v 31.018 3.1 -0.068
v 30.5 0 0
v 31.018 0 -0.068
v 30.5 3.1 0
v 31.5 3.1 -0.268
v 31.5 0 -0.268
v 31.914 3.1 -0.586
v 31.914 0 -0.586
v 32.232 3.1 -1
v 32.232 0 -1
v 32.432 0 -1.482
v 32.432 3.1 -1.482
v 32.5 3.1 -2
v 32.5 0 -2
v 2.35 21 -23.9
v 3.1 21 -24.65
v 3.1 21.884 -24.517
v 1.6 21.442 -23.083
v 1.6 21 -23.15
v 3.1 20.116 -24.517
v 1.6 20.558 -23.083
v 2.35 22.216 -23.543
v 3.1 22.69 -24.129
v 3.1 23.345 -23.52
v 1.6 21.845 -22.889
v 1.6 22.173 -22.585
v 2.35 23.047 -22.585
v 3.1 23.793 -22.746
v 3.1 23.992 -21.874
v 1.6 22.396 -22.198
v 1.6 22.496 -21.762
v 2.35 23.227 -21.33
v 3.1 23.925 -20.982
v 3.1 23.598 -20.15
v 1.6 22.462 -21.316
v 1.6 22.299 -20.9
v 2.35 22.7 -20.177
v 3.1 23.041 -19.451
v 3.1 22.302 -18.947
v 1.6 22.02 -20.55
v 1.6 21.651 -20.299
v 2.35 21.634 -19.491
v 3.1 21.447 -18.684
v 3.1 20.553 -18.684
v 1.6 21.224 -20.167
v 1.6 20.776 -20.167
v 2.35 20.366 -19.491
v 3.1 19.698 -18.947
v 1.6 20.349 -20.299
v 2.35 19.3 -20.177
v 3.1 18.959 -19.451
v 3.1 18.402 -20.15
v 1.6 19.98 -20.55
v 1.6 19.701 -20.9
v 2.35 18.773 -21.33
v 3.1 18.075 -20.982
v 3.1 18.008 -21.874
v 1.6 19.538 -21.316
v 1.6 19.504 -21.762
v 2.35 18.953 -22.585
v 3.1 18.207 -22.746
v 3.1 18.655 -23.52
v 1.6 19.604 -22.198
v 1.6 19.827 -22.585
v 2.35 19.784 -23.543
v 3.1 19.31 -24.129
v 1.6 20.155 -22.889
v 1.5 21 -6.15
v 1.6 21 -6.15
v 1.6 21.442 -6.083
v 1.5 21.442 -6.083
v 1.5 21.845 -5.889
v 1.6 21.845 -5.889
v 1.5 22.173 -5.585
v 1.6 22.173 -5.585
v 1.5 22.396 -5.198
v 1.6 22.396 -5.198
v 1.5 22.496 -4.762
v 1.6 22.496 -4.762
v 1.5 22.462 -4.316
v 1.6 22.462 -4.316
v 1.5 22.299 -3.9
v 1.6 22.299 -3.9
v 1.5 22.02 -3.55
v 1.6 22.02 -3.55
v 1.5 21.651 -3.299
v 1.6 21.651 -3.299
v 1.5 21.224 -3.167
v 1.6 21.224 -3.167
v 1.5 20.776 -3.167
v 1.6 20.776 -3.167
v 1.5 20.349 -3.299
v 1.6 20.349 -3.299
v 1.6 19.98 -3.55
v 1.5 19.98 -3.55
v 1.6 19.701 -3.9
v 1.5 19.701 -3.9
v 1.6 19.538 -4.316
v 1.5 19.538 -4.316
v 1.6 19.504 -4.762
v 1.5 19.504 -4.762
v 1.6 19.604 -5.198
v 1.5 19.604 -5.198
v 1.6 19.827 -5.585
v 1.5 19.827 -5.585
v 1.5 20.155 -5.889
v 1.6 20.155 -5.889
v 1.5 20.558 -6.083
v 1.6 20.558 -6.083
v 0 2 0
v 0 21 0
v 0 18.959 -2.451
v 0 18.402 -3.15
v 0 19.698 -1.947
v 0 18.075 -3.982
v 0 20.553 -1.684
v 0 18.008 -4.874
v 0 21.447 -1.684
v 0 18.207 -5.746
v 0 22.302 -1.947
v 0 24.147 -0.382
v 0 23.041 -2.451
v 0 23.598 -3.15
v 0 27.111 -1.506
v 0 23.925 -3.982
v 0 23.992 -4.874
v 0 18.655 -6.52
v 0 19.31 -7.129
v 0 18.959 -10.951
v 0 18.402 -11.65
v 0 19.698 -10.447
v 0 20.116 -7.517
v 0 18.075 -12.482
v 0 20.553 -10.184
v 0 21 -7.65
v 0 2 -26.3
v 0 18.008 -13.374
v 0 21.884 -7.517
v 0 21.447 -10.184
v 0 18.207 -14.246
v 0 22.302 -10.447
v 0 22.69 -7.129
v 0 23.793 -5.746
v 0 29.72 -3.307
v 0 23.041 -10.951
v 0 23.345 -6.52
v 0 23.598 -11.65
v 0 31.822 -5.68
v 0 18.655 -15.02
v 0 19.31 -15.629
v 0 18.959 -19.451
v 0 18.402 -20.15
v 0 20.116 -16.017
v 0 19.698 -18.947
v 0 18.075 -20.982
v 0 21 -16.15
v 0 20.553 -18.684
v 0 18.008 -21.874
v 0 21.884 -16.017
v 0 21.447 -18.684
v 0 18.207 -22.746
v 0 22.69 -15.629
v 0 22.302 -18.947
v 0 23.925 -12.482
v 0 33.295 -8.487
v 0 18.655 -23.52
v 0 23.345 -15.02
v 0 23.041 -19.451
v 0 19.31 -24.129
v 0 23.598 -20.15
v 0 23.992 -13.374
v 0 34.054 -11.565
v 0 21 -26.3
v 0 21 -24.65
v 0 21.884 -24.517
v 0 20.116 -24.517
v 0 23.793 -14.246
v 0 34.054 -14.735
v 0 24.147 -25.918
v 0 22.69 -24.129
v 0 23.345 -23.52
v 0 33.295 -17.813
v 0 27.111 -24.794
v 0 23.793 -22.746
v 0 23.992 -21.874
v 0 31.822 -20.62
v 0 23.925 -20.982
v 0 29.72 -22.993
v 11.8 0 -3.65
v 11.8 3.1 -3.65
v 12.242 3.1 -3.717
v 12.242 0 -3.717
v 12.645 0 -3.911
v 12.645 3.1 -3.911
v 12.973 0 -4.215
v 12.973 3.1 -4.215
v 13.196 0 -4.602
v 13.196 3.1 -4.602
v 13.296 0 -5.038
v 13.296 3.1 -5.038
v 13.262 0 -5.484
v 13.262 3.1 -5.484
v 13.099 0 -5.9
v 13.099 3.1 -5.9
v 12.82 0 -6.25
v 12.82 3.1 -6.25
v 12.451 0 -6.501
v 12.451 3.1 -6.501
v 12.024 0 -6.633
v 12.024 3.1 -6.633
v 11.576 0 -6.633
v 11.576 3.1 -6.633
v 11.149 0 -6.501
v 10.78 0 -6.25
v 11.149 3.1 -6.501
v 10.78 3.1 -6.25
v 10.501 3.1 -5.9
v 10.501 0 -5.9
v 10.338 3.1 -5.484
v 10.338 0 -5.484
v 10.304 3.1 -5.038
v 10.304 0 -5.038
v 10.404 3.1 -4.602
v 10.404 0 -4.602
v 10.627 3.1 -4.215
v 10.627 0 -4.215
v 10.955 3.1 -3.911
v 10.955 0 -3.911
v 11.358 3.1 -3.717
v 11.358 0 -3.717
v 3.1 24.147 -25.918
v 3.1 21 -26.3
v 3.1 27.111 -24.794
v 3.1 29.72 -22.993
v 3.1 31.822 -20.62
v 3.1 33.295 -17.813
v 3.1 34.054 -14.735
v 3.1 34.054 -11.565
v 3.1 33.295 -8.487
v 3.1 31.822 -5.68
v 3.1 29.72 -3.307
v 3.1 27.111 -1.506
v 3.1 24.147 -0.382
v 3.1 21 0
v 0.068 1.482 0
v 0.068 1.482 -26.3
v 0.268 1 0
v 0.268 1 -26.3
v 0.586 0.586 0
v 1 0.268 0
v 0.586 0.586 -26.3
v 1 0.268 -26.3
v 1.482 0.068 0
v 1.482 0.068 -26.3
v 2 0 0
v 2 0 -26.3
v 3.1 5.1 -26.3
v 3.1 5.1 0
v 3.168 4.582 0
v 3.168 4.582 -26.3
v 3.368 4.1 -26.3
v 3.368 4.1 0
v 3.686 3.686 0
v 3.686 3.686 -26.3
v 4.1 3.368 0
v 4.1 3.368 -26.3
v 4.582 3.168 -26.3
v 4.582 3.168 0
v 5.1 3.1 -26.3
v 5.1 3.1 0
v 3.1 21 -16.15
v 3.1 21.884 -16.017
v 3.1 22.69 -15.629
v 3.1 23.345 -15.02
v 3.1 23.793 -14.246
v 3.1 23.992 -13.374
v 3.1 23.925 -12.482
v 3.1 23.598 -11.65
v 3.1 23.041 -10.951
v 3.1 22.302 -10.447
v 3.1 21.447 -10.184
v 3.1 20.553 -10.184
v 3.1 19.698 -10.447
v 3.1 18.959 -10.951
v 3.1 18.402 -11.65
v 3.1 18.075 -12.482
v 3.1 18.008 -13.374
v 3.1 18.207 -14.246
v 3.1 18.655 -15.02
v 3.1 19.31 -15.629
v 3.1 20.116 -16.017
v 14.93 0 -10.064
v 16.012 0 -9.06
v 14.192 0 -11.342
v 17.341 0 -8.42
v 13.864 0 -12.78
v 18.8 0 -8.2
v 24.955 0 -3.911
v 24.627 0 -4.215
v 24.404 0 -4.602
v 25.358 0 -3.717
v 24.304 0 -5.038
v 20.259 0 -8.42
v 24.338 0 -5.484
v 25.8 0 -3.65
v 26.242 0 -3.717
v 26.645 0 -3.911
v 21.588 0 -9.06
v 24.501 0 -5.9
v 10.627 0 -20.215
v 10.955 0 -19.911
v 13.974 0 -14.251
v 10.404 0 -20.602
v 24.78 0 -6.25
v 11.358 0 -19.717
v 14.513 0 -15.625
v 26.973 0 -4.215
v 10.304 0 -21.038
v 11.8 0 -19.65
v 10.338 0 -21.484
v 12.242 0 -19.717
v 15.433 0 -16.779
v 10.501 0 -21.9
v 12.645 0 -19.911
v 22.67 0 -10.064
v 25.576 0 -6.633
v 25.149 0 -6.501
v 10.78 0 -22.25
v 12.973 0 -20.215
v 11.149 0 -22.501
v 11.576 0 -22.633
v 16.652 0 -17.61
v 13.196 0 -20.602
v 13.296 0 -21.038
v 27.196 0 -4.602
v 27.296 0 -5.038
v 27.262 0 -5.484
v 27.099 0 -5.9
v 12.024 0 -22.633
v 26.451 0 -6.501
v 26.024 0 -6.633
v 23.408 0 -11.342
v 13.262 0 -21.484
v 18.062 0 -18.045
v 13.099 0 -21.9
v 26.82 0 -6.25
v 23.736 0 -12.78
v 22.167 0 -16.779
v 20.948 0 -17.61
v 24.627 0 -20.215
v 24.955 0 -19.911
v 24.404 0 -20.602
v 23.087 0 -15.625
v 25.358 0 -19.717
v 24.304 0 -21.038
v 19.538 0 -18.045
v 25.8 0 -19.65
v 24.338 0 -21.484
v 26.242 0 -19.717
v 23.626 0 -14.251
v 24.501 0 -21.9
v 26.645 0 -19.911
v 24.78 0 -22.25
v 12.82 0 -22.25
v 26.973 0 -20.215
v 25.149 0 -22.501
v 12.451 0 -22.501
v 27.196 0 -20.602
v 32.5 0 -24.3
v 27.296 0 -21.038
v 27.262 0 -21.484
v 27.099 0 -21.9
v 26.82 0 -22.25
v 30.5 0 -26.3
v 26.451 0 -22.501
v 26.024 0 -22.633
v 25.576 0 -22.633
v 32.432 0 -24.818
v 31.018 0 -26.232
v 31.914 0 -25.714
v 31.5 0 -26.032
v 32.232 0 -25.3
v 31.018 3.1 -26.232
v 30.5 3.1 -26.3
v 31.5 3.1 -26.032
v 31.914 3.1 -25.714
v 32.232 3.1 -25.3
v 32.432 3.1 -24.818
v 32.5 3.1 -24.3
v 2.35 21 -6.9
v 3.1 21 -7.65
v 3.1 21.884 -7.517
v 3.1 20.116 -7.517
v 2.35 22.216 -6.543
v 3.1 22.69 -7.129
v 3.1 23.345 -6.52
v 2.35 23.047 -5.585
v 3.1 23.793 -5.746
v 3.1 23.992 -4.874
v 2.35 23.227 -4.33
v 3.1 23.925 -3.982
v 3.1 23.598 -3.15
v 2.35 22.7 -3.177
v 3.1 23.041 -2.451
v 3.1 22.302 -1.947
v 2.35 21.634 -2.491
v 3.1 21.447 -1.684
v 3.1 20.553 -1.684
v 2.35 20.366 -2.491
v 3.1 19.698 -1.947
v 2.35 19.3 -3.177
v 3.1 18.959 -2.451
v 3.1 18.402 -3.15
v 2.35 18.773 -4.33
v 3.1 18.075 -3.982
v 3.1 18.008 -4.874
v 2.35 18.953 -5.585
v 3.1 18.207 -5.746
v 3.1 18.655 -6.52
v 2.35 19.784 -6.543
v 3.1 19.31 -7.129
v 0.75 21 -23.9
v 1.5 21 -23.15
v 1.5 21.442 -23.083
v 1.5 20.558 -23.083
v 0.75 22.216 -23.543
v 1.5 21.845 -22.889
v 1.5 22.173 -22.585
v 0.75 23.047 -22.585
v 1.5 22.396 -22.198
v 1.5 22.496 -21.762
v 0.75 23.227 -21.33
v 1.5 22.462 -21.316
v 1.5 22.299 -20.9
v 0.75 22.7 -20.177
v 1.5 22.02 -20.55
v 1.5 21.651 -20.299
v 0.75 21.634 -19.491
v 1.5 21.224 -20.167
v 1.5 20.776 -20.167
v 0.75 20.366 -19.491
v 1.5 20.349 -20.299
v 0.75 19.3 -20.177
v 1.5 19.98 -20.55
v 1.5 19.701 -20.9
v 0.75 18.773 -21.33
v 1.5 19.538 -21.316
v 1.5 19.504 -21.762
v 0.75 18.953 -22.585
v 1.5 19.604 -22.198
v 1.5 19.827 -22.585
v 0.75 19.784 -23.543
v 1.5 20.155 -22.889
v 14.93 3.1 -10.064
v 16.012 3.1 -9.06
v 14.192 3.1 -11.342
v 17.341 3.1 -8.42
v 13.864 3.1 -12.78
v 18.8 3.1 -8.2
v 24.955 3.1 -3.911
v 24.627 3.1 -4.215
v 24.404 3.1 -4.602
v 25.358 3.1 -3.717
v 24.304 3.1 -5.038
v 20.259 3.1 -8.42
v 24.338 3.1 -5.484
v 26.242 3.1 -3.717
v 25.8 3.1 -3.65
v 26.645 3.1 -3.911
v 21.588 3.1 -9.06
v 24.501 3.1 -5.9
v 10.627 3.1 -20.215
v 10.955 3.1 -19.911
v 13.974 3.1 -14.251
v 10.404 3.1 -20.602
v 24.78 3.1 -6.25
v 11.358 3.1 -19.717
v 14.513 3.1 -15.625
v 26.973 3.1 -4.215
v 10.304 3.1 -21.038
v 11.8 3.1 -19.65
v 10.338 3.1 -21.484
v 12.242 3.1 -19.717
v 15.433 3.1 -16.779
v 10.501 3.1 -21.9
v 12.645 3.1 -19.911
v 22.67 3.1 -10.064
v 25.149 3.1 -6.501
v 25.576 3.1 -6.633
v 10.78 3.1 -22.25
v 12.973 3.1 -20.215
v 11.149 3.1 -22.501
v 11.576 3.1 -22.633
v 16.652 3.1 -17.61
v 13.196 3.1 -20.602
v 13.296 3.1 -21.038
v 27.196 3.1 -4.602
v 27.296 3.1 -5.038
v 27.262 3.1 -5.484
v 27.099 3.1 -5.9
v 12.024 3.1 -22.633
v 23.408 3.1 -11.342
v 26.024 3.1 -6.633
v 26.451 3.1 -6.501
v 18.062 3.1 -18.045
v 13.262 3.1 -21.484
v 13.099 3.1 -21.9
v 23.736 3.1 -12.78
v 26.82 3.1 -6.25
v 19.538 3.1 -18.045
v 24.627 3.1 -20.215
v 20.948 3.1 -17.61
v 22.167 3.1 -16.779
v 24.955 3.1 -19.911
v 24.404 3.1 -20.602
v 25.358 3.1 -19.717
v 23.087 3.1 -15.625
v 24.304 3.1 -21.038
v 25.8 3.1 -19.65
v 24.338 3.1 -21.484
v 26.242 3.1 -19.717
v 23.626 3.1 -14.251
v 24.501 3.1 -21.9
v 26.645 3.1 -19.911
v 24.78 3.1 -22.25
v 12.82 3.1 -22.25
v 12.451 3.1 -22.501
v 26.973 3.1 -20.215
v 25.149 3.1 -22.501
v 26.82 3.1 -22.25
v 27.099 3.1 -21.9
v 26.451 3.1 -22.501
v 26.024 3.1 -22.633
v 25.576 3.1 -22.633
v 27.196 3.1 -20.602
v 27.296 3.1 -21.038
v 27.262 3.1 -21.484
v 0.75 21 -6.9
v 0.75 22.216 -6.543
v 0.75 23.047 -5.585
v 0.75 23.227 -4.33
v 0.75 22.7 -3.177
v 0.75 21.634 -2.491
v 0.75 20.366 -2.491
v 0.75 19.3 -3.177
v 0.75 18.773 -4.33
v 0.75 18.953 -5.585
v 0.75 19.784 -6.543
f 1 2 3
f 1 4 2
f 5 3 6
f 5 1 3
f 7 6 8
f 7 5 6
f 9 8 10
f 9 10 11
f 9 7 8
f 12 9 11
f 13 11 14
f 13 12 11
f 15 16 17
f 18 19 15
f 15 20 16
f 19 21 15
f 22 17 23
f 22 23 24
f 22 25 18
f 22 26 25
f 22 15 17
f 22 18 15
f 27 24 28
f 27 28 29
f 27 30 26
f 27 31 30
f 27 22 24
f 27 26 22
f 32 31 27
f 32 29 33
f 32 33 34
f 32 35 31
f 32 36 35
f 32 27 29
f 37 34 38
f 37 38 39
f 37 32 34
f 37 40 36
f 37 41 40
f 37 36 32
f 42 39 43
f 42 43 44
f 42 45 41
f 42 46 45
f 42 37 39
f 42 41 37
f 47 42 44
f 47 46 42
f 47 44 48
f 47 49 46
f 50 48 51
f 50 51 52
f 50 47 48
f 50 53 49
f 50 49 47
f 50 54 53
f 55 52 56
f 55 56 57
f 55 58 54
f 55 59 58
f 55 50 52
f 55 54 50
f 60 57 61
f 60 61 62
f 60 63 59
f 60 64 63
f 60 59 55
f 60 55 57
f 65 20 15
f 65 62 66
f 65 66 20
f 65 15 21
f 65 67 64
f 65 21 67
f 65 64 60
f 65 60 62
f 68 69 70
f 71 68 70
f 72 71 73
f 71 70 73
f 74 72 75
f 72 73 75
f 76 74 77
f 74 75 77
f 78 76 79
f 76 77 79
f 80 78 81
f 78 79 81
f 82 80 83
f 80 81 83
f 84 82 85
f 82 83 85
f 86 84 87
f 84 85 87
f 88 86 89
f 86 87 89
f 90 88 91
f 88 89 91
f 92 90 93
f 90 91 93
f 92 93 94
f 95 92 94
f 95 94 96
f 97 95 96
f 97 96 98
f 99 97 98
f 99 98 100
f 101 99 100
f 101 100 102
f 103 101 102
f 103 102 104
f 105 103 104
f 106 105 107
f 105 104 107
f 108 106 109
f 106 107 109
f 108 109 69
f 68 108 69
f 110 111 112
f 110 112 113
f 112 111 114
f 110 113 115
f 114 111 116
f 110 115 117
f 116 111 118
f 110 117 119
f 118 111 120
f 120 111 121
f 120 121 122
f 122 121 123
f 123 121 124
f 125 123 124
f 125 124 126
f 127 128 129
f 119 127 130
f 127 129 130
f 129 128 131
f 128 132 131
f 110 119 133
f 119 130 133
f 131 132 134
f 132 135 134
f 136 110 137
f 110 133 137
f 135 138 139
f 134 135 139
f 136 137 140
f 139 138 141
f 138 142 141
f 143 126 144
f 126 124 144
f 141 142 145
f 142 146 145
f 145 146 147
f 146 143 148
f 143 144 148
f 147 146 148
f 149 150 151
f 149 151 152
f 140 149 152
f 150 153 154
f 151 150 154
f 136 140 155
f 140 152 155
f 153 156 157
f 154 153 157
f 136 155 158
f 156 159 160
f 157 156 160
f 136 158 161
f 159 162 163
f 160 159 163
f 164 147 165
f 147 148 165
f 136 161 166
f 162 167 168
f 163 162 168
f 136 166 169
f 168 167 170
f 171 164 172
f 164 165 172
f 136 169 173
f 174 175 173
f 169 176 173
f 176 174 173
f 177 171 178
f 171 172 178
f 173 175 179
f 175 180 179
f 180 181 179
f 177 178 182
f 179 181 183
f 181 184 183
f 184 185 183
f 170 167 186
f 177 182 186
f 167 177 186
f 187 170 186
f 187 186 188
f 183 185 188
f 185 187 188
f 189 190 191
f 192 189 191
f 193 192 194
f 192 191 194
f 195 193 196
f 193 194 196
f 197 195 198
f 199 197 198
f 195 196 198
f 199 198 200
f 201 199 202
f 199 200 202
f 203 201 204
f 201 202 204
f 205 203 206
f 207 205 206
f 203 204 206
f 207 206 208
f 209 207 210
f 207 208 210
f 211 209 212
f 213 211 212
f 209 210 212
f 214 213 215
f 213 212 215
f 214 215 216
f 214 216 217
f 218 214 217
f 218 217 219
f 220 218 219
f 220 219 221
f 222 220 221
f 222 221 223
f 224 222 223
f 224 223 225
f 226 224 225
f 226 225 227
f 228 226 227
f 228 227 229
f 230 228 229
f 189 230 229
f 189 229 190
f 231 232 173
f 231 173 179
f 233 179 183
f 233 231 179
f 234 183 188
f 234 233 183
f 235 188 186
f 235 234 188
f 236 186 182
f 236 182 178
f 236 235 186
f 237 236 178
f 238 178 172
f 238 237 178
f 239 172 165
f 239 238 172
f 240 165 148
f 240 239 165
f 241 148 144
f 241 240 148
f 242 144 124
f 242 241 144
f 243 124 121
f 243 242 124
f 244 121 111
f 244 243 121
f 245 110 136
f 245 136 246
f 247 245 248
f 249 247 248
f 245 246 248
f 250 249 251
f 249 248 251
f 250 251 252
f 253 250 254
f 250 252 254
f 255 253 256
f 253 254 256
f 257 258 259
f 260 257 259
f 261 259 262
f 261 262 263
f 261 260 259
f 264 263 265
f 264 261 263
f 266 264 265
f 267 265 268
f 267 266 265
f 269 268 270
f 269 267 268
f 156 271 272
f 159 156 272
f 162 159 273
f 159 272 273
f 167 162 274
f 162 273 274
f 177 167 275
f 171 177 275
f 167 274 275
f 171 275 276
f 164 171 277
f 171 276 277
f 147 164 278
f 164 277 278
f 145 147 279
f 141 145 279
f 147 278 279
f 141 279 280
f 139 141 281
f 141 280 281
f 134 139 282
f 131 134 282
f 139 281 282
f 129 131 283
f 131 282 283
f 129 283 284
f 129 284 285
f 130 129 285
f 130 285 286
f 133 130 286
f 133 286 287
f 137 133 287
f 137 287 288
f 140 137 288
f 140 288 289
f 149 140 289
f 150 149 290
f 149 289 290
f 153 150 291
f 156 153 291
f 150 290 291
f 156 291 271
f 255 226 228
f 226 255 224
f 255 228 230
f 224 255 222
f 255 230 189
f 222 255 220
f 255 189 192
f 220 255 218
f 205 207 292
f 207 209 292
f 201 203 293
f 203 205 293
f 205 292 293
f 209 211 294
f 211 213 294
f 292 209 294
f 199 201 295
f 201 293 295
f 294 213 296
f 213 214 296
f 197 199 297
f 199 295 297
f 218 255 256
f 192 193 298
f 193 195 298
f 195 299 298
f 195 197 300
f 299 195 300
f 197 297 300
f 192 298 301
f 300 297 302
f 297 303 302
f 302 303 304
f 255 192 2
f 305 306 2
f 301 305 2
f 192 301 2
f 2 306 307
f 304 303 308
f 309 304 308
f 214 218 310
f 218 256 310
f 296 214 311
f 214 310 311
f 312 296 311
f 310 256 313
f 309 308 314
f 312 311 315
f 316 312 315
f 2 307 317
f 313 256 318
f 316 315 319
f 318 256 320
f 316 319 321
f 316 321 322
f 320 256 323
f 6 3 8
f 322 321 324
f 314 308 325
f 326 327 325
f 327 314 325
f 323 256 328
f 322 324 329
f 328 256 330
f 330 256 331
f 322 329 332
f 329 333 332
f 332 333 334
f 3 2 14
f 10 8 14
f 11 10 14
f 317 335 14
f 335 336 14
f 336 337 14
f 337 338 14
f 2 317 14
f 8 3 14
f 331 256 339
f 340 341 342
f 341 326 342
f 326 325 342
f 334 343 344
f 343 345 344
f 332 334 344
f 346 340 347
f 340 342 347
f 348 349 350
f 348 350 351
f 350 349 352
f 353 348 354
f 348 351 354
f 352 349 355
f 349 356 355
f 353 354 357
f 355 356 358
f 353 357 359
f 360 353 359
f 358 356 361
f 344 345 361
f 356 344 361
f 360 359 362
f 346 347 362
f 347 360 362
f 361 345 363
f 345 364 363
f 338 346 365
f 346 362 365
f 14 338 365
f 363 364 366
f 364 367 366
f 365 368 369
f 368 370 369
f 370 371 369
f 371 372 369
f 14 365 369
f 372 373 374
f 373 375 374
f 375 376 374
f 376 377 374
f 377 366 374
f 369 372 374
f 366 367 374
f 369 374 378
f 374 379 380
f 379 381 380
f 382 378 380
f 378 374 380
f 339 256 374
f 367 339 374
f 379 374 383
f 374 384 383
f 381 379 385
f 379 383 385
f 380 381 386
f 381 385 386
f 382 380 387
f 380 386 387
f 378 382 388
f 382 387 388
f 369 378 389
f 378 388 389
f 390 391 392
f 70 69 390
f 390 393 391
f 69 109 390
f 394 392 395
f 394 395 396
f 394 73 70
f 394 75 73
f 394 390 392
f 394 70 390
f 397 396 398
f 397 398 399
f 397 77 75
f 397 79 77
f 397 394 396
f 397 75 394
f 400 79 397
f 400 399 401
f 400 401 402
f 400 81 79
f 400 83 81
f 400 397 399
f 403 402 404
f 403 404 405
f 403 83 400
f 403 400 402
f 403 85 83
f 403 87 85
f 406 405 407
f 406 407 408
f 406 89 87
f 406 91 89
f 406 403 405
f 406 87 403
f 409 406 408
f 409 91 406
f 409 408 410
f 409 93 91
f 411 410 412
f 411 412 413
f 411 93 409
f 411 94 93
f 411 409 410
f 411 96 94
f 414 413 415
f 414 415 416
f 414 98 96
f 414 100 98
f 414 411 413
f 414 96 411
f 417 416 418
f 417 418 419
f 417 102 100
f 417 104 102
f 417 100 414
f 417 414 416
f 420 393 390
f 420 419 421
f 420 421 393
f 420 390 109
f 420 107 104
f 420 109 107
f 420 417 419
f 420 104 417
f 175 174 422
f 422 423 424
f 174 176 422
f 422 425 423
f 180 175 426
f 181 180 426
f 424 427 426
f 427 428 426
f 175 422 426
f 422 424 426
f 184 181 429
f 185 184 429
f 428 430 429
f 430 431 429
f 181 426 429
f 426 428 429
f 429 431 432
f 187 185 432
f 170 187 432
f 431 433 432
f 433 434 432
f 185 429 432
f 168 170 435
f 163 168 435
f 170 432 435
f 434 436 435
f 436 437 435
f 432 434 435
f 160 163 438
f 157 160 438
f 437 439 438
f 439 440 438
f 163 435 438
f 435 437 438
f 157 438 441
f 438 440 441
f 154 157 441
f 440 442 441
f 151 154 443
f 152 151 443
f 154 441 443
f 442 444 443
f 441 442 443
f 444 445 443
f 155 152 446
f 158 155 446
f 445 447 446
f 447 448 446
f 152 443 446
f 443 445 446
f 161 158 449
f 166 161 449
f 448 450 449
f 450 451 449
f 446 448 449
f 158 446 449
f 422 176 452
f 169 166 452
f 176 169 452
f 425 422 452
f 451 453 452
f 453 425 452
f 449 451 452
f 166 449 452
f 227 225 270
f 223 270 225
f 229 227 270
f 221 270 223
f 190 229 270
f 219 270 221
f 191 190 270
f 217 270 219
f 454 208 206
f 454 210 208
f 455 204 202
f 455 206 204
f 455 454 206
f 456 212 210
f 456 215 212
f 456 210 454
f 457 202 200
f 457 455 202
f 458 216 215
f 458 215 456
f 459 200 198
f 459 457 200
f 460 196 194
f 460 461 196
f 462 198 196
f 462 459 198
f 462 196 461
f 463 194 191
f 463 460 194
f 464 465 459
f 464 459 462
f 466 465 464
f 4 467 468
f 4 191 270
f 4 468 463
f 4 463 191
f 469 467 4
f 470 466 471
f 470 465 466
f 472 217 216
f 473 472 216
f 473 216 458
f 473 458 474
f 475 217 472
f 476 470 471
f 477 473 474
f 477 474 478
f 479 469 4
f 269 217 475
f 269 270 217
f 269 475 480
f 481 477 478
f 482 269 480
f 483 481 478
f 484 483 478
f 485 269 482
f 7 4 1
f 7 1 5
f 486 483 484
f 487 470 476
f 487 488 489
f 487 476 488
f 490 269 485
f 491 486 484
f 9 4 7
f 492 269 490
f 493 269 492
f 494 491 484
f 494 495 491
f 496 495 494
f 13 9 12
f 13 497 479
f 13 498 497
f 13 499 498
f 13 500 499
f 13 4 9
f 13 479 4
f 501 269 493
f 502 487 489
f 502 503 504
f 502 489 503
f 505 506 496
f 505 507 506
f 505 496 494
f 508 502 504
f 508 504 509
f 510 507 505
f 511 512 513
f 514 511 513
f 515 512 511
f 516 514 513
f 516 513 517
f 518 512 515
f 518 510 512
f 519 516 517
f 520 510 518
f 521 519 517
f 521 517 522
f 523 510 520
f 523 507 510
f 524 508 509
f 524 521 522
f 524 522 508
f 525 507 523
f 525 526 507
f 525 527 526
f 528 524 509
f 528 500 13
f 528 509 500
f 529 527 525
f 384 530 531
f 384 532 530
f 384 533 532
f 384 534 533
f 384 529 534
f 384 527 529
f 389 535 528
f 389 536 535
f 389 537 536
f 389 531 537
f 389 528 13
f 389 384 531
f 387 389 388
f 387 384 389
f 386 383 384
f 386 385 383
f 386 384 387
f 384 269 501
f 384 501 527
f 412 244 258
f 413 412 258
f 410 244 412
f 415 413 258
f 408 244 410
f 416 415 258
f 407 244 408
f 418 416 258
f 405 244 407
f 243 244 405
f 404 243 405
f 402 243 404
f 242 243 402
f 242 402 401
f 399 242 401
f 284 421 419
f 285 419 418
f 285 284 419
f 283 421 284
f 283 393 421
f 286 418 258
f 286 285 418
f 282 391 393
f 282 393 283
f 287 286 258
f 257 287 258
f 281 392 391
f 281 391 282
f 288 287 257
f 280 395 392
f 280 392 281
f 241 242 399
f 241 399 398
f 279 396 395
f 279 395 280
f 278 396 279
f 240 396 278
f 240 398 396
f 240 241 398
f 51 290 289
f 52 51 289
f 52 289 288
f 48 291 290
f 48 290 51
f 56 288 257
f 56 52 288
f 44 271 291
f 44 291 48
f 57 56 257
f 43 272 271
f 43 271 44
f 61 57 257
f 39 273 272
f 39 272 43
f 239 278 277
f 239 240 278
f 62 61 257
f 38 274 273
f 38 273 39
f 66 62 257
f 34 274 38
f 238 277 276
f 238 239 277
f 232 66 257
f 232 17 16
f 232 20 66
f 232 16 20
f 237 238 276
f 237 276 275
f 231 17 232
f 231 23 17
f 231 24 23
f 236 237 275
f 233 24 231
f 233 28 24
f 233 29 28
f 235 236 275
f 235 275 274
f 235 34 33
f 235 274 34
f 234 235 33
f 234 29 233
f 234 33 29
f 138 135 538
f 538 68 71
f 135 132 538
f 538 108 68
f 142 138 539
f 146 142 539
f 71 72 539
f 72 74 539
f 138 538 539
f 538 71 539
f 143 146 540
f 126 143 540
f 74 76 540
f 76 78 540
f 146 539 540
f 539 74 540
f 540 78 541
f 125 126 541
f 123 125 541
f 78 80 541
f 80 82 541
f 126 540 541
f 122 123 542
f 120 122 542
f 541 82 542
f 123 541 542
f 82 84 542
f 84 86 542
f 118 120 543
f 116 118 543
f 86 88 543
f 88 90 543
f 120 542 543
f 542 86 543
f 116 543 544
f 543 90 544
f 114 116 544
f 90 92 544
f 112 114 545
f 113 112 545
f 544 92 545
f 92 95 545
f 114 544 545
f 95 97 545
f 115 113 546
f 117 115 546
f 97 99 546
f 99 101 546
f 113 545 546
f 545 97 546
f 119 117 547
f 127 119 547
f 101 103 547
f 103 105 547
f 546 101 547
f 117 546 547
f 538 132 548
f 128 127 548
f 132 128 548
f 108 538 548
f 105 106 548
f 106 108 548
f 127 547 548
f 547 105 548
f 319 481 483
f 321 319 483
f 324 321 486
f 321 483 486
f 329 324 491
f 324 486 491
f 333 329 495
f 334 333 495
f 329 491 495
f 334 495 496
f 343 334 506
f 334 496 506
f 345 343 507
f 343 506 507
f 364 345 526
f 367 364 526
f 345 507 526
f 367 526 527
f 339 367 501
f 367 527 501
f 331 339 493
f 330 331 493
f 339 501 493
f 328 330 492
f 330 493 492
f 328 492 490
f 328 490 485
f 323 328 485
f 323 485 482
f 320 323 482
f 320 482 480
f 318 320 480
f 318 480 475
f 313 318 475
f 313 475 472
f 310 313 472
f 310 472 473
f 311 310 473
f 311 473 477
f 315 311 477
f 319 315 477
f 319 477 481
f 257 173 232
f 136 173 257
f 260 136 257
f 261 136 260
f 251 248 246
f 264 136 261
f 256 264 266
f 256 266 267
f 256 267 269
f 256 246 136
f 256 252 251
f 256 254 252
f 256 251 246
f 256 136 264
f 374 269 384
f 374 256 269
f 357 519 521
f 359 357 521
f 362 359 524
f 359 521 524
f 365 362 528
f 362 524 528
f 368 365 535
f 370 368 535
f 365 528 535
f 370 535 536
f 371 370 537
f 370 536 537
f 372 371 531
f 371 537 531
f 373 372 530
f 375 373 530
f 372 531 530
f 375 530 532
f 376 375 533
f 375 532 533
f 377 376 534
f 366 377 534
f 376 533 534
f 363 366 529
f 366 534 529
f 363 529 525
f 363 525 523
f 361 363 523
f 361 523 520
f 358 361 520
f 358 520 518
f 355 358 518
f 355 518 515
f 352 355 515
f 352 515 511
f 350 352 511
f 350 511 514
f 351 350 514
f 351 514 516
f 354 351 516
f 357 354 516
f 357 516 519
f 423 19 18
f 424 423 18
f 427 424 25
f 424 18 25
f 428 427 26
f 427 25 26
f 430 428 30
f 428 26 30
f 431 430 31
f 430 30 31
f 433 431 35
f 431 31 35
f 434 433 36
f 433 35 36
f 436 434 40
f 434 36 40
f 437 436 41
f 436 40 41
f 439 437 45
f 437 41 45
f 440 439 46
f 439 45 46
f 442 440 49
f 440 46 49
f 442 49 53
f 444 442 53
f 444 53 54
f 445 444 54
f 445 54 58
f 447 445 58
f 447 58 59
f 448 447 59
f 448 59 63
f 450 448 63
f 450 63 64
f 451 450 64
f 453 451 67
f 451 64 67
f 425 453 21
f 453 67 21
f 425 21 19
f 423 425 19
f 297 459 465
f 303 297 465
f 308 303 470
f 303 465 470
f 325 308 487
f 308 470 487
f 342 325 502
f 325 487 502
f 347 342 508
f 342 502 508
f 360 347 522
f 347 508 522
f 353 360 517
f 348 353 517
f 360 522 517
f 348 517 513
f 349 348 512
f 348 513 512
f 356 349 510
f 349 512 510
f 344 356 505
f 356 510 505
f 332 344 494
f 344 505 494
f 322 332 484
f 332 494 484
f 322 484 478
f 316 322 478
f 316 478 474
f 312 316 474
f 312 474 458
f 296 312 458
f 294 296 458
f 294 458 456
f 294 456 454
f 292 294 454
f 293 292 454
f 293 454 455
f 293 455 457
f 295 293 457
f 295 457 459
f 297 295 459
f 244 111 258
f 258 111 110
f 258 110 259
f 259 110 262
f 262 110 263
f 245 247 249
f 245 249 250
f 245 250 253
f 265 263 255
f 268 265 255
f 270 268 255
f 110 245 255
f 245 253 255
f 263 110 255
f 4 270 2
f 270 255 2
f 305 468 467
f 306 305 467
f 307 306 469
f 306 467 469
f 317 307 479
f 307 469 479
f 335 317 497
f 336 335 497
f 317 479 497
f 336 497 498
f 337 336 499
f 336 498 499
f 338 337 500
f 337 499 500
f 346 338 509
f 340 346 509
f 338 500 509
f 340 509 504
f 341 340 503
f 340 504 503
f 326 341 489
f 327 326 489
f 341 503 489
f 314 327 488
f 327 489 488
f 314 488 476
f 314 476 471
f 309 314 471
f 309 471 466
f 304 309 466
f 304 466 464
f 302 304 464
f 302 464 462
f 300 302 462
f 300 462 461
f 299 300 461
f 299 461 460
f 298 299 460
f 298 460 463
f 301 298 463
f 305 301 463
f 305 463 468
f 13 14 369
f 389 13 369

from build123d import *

# Parameters (mm, degrees)
SKETCH1_W           = 32.5
SKETCH1_H           = 26.3
BOSS_EXTRUDE1_DEPTH = 3.1
SKETCH2_W           = 3.1
SKETCH2_H           = 26.3
BOSS_EXTRUDE2_DEPTH = 17.9
BOSS_EXTRUDE3_DEPTH = 3.1
FILLET1_R           = 2
SKETCH4_R           = 3
SKETCH4_R_2         = 1.5
CUT_EXTRUDE1_DEPTH  = 3.1
CHAMFER1_SIZE       = 1.5
SKETCH5_R           = 4.95
SKETCH5_R_2         = 1.5
CUT_EXTRUDE2_DEPTH  = 25


with BuildPart() as part:
    # Sketch1 → Boss-Extrude1 (new body)
    with BuildSketch(Plane(origin=(0, 0, 0), x_dir=(1, 0, 0), z_dir=(0, 1, 0))):
        with Locations((16.25, 13.15)):
            Rectangle(SKETCH1_W, SKETCH1_H)
    extrude(amount=BOSS_EXTRUDE1_DEPTH)

    # Sketch2 → Boss-Extrude2 (add)
    with BuildSketch(Plane(origin=(0, 3.1, 0), x_dir=(1, 0, 0), z_dir=(0, 1, 0))):
        with Locations((1.55, 13.15)):
            Rectangle(SKETCH2_W, SKETCH2_H)
    extrude(amount=BOSS_EXTRUDE2_DEPTH)

    # Sketch3 → Boss-Extrude3 (add)
    with BuildSketch(Plane(origin=(3.1, 0, 0), x_dir=(0, 0, -1), z_dir=(1, 0, 0))):
        with BuildLine():
            Line((0, 21), (26.3, 21))
            ThreePointArc((26.3, 21), (13.15, 34.15), (0, 21))
        make_face()
    extrude(amount=-BOSS_EXTRUDE3_DEPTH)

    # Fillet1
    fillet1_edges = [part.edges().sort_by_distance(p)[0] for p in [
        (3.1, 3.1, -13.15),
        (0, 0, -13.15),
        (32.5, 1.55, -26.3),
        (32.5, 1.55, 0),
    ]]
    fillet(fillet1_edges, radius=FILLET1_R)

    # Sketch4 → Cut-Extrude1 (cut)
    with BuildSketch(Plane(origin=(3.1, 0, 0), x_dir=(0, 0, -1), z_dir=(1, 0, 0))):
        with Locations((13.15, 21)):
            Circle(SKETCH4_R)
        with Locations((21.65, 21)):
            Circle(SKETCH4_R_2)
        with Locations((4.65, 21)):
            Circle(SKETCH4_R_2)
    extrude(amount=-CUT_EXTRUDE1_DEPTH, mode=Mode.SUBTRACT)

    # Chamfer1
    chamfer1_edges = [part.edges().sort_by_distance(p)[0] for p in [
        (0, 21, -20.15),
        (0, 21, -3.15),
        (3.1, 21, -20.15),
        (3.1, 21, -3.15),
    ]]
    chamfer(chamfer1_edges, length=CHAMFER1_SIZE)

    # Sketch5 → Cut-Extrude2 (cut)
    with BuildSketch(Plane(origin=(0, 3.1, 0), x_dir=(1, 0, 0), z_dir=(0, 1, 0))):
        with Locations((18.8, 13.15)):
            Circle(SKETCH5_R)
        with Locations((25.8, 21.15)):
            Circle(SKETCH5_R_2)
        with Locations((25.8, 5.15)):
            Circle(SKETCH5_R_2)
        with Locations((11.8, 21.15)):
            Circle(SKETCH5_R_2)
        with Locations((11.8, 5.15)):
            Circle(SKETCH5_R_2)
    extrude(amount=-CUT_EXTRUDE2_DEPTH, mode=Mode.SUBTRACT)


solid = part.part
